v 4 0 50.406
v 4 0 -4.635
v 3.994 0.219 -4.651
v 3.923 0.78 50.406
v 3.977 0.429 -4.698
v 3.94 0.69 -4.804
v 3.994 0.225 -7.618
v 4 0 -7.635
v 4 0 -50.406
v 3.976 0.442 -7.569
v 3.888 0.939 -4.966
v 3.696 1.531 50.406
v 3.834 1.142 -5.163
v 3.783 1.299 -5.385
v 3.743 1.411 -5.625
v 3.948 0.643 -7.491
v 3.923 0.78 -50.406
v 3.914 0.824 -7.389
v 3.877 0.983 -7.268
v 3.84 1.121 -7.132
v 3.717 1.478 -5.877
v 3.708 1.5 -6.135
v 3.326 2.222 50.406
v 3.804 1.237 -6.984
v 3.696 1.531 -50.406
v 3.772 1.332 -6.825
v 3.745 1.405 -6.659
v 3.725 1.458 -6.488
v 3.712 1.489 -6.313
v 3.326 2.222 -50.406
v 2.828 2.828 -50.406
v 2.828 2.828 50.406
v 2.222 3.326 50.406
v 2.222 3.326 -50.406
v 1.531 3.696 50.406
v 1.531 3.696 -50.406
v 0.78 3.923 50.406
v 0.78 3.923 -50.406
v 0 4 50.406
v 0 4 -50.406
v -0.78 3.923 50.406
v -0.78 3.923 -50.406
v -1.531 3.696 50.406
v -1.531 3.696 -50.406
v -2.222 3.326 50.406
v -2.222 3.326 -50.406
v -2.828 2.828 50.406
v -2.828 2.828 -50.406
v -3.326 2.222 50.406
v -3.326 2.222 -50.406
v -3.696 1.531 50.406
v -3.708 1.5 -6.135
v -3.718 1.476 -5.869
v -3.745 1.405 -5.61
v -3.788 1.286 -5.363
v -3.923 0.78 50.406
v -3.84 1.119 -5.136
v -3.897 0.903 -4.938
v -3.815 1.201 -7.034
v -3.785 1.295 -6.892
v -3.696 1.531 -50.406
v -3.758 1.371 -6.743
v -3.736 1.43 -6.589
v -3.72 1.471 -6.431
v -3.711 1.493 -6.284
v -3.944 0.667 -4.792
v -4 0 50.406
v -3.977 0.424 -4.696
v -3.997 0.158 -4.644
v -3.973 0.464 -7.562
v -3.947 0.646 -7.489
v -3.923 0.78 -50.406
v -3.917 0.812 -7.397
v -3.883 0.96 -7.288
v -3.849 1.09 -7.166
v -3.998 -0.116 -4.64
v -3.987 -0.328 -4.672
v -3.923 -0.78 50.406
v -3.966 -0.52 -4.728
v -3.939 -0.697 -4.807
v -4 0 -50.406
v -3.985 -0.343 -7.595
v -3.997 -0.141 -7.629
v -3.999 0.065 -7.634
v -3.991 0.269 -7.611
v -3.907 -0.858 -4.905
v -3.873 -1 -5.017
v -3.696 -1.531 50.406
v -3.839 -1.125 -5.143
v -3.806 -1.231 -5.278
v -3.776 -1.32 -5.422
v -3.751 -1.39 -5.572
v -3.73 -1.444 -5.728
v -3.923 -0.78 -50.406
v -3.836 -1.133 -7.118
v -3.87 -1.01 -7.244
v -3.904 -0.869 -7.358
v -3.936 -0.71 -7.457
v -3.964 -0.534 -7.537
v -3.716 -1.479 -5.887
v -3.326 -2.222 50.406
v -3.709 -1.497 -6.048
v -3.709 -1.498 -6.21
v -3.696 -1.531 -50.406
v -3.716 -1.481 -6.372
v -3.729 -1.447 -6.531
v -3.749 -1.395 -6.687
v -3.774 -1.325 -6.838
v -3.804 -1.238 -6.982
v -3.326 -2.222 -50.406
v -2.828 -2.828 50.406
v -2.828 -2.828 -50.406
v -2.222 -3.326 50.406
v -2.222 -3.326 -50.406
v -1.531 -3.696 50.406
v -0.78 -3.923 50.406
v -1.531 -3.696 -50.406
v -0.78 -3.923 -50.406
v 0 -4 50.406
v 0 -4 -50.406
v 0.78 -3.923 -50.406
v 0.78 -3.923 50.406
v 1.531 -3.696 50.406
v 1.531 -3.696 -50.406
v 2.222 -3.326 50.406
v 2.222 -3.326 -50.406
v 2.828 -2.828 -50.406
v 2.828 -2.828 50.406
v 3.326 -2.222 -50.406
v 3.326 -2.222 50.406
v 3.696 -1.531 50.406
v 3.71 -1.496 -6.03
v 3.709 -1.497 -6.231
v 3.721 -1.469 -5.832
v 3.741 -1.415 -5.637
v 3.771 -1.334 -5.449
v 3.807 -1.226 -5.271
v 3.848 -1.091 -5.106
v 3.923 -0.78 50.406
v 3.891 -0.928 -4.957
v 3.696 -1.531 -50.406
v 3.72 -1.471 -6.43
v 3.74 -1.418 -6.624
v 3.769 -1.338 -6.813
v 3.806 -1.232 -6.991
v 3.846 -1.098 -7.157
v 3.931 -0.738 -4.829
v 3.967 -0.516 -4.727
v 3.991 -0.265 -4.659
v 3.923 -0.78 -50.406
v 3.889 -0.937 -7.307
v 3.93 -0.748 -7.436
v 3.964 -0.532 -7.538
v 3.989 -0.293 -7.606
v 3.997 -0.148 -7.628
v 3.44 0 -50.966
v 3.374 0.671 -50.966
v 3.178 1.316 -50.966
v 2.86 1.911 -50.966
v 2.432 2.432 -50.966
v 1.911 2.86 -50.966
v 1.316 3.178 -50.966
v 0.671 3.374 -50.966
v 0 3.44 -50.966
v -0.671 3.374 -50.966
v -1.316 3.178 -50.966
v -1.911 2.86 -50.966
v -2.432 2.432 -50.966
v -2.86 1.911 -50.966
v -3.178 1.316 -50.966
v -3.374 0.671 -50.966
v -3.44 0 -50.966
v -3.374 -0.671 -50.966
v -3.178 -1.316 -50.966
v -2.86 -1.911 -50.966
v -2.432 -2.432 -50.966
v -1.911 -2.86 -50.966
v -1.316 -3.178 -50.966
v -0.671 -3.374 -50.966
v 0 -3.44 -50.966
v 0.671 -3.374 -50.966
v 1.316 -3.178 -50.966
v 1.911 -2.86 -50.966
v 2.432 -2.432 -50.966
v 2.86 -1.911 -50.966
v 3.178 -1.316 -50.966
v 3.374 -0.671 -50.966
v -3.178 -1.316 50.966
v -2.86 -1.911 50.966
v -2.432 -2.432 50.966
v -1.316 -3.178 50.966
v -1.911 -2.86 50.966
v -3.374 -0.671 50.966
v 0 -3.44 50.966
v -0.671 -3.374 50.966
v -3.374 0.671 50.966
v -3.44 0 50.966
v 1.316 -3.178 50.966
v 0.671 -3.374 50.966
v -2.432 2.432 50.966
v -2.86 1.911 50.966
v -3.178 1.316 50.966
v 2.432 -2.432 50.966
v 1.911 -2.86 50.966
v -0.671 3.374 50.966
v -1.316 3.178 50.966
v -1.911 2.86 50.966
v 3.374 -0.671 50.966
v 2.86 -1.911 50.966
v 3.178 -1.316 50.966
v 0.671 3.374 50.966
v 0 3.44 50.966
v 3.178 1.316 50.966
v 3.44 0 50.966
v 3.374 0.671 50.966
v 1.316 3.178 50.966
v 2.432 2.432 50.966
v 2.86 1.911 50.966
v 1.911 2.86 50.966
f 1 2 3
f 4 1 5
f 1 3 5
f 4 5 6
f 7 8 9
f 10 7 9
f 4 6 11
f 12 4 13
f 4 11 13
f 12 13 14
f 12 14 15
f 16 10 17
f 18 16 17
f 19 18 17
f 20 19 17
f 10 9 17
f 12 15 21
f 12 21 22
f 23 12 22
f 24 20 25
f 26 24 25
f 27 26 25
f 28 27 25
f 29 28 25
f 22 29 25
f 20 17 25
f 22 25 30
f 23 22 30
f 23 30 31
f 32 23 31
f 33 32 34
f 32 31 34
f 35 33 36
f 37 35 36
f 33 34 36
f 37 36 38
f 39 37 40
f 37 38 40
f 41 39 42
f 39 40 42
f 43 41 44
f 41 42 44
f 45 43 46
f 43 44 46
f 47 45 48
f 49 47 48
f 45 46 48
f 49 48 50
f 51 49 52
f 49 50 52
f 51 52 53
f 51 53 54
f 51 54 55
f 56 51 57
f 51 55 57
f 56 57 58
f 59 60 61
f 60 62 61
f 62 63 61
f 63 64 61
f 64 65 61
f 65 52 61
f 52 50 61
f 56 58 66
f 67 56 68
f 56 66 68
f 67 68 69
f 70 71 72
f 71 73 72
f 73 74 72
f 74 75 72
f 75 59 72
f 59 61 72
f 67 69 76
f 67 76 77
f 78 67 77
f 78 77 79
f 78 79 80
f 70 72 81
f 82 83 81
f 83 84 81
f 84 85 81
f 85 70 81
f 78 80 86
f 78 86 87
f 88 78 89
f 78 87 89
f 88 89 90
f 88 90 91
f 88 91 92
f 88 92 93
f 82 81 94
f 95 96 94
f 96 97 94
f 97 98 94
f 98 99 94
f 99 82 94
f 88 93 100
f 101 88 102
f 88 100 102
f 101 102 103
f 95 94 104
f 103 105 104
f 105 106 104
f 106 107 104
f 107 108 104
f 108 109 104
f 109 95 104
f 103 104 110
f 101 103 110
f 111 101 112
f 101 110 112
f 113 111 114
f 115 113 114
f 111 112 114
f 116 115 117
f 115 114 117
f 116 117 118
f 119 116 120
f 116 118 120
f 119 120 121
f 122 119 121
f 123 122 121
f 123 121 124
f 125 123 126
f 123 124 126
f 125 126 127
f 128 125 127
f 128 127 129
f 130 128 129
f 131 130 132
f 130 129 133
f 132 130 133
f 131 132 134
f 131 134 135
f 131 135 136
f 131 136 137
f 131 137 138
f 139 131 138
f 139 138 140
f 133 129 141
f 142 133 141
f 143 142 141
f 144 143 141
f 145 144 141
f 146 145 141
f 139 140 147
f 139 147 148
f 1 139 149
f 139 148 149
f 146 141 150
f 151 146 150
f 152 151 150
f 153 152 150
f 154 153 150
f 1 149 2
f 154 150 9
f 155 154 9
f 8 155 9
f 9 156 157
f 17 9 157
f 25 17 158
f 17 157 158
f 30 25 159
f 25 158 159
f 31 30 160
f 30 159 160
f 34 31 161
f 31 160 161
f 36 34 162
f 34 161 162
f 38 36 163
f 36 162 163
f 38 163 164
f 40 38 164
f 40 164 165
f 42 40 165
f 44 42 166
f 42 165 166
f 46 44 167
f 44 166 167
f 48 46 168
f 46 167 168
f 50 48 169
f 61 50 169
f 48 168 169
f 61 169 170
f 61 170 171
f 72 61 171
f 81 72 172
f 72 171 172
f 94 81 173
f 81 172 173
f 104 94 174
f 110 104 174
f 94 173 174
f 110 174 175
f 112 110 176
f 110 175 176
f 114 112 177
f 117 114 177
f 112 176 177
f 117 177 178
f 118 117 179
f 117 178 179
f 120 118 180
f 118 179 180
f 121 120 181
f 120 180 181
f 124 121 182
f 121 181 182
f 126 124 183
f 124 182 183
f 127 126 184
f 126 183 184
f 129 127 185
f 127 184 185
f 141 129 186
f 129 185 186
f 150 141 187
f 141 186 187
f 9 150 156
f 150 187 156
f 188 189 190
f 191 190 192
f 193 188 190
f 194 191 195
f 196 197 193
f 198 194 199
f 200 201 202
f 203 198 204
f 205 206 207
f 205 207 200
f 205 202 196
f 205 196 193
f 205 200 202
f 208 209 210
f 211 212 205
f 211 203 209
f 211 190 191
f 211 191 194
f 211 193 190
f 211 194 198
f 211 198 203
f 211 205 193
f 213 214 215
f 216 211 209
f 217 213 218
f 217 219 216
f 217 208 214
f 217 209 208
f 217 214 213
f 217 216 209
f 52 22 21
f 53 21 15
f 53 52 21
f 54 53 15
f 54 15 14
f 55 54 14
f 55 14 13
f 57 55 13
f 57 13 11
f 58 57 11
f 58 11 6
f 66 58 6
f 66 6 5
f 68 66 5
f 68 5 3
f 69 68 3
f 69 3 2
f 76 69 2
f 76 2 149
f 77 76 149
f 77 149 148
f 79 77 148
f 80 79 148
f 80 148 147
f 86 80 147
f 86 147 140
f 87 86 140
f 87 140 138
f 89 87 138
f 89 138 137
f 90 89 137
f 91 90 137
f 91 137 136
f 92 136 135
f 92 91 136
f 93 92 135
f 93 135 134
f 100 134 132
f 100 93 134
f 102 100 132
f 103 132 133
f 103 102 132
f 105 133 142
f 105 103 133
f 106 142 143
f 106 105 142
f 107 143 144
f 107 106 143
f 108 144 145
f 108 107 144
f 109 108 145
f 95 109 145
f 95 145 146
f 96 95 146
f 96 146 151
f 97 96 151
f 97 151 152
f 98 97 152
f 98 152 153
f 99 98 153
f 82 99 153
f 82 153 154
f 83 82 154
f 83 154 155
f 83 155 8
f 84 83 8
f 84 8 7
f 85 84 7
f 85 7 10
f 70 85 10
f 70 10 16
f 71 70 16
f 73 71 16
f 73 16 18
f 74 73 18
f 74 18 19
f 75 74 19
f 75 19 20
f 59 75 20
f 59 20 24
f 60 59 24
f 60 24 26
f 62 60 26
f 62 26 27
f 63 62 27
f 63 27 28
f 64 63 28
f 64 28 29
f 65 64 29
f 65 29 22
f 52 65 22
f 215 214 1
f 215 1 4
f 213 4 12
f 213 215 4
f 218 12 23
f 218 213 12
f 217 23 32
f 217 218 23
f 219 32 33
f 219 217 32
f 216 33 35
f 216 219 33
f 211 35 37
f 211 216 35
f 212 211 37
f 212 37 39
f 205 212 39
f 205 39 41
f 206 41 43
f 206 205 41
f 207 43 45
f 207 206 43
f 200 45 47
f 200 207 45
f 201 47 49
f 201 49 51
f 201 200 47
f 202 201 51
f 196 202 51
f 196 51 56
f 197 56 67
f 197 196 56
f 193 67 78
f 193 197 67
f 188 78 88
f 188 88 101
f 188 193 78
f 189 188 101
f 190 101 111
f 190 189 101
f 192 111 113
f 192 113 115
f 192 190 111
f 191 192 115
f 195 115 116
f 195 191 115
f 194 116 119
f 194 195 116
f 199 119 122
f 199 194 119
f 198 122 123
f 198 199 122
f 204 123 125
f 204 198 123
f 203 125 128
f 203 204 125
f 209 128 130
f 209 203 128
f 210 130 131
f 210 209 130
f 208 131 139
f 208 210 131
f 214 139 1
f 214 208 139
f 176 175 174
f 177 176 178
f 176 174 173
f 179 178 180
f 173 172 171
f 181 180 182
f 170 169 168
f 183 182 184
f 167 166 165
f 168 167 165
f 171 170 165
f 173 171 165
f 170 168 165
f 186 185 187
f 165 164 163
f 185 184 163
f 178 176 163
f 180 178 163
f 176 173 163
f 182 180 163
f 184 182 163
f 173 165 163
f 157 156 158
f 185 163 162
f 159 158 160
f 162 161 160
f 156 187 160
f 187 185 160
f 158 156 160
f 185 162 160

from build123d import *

# Parameters (mm, degrees)
BOSS_EXTRUDE1_DEPTH      = 50.9662557
BOSS_EXTRUDE1_DEPTH_BACK = 50.9662557
SKETCH1_R                = 4
CUT_EXTRUDE1_START       = -4.000000101
CUT_EXTRUDE1_OUTLINE_R   = 1.500000048
CUT_EXTRUDE1_DEPTH       = 8.000000202
CHAMFER1_SIZE            = 0.56


# Read off the part's stored shape, not the designer's step: Cut-Extrude1
with BuildPart() as part:
    # Sketch1 → Boss-Extrude1 (new, two sides: drawn at the far end of the back side and taken through both)
    with BuildSketch(Plane.XY.offset(-BOSS_EXTRUDE1_DEPTH_BACK)):
        Circle(SKETCH1_R)
    extrude(amount=BOSS_EXTRUDE1_DEPTH + BOSS_EXTRUDE1_DEPTH_BACK)

    # Cut-Extrude1 outline → Cut-Extrude1 (cut)
    with BuildSketch(Plane.YZ.offset(CUT_EXTRUDE1_START)):
        with Locations((0, -6.1352557)):
            Circle(CUT_EXTRUDE1_OUTLINE_R)
    extrude(amount=CUT_EXTRUDE1_DEPTH, mode=Mode.SUBTRACT)

    # Chamfer1
    chamfer1_edges = [part.edges().sort_by_distance(p)[0] for p in [
        (-4, 0, -50.9662557),
        (-4, 0, 50.9662557),
    ]]
    chamfer(chamfer1_edges, length=CHAMFER1_SIZE)


solid = part.part
